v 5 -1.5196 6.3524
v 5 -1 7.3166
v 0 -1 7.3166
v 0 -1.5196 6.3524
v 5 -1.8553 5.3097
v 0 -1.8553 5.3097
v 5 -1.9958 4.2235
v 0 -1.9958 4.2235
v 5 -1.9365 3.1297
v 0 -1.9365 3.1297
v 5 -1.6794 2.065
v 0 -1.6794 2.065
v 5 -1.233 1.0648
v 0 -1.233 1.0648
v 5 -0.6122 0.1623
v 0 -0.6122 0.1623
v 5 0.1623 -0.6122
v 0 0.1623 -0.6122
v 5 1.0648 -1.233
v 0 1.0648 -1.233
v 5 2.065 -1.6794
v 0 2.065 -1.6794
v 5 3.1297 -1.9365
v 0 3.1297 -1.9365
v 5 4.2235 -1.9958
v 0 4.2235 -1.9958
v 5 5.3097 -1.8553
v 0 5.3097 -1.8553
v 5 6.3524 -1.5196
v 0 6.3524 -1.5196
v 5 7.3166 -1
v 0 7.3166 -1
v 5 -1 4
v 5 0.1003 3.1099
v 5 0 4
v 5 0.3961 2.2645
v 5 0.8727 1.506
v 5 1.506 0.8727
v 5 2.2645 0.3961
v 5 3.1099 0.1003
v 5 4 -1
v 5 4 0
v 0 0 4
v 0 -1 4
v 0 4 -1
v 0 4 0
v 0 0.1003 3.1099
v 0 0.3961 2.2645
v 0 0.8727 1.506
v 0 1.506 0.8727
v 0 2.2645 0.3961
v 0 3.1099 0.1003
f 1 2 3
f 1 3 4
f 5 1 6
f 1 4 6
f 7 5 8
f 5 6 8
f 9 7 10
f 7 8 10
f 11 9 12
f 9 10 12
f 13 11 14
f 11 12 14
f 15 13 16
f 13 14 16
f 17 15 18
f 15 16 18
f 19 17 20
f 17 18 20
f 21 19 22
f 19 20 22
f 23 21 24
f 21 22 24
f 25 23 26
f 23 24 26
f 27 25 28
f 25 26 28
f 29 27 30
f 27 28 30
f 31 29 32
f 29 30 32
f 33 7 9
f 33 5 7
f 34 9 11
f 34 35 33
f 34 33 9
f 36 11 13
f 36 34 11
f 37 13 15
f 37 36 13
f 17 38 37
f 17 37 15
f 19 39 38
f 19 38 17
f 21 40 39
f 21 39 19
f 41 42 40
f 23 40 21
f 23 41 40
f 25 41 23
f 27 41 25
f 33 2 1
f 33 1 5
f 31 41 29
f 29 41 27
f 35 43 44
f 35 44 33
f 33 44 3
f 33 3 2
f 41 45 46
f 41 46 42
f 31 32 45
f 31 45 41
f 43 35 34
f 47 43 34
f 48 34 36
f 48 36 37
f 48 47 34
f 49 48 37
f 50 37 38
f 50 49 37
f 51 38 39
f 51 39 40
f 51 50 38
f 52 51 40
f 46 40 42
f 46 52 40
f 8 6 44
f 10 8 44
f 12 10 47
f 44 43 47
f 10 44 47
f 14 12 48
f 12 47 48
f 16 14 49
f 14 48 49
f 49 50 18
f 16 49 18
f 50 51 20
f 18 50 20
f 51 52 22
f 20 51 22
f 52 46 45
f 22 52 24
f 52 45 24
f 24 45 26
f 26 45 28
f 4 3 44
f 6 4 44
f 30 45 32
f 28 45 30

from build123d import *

# Parameters (mm, degrees)
BOX030_W      = 5
BOX030_H      = 10
BOX030_DEPTH  = 8
BOX029_W      = 5
BOX029_H      = 8
BOX029_DEPTH  = 10
TUBE012_R     = 6
TUBE012_R_2   = 4
TUBE012_DEPTH = 5


with BuildPart() as cube030:
    # Box030 → Box030 (new body)
    with BuildSketch(Plane(origin=(0, -2, 3), x_dir=(1, 0, 0), z_dir=(0, 0, 1))):
        with Locations((2.5, 5)):
            Rectangle(BOX030_W, BOX030_H)
    extrude(amount=BOX030_DEPTH)


with BuildPart() as cube029:
    # Box029 → Box029 (new body)
    with BuildSketch(Plane(origin=(0, 3, -2), x_dir=(1, 0, 0), z_dir=(0, 0, 1))):
        with Locations((2.5, 4)):
            Rectangle(BOX029_W, BOX029_H)
    extrude(amount=BOX029_DEPTH)


with BuildPart() as cut034:
    # Tube012 → Tube012 (new body)
    with BuildSketch(Plane(origin=(0, 3, 3), x_dir=(0, 0, -1), z_dir=(1, 0, 0))):
        Circle(TUBE012_R)
        Circle(TUBE012_R_2, mode=Mode.SUBTRACT)
    extrude(amount=TUBE012_DEPTH)

    # Cut033: cut Cube029
    add(cube029.part, mode=Mode.SUBTRACT)

    # Cut034: cut Cube030
    add(cube030.part, mode=Mode.SUBTRACT)


with BuildPart() as cut034_1:
    # Cut034 placement: moved
    add(cut034.part.moved(Location((0, 1, 1))))


solid = cut034_1.part
